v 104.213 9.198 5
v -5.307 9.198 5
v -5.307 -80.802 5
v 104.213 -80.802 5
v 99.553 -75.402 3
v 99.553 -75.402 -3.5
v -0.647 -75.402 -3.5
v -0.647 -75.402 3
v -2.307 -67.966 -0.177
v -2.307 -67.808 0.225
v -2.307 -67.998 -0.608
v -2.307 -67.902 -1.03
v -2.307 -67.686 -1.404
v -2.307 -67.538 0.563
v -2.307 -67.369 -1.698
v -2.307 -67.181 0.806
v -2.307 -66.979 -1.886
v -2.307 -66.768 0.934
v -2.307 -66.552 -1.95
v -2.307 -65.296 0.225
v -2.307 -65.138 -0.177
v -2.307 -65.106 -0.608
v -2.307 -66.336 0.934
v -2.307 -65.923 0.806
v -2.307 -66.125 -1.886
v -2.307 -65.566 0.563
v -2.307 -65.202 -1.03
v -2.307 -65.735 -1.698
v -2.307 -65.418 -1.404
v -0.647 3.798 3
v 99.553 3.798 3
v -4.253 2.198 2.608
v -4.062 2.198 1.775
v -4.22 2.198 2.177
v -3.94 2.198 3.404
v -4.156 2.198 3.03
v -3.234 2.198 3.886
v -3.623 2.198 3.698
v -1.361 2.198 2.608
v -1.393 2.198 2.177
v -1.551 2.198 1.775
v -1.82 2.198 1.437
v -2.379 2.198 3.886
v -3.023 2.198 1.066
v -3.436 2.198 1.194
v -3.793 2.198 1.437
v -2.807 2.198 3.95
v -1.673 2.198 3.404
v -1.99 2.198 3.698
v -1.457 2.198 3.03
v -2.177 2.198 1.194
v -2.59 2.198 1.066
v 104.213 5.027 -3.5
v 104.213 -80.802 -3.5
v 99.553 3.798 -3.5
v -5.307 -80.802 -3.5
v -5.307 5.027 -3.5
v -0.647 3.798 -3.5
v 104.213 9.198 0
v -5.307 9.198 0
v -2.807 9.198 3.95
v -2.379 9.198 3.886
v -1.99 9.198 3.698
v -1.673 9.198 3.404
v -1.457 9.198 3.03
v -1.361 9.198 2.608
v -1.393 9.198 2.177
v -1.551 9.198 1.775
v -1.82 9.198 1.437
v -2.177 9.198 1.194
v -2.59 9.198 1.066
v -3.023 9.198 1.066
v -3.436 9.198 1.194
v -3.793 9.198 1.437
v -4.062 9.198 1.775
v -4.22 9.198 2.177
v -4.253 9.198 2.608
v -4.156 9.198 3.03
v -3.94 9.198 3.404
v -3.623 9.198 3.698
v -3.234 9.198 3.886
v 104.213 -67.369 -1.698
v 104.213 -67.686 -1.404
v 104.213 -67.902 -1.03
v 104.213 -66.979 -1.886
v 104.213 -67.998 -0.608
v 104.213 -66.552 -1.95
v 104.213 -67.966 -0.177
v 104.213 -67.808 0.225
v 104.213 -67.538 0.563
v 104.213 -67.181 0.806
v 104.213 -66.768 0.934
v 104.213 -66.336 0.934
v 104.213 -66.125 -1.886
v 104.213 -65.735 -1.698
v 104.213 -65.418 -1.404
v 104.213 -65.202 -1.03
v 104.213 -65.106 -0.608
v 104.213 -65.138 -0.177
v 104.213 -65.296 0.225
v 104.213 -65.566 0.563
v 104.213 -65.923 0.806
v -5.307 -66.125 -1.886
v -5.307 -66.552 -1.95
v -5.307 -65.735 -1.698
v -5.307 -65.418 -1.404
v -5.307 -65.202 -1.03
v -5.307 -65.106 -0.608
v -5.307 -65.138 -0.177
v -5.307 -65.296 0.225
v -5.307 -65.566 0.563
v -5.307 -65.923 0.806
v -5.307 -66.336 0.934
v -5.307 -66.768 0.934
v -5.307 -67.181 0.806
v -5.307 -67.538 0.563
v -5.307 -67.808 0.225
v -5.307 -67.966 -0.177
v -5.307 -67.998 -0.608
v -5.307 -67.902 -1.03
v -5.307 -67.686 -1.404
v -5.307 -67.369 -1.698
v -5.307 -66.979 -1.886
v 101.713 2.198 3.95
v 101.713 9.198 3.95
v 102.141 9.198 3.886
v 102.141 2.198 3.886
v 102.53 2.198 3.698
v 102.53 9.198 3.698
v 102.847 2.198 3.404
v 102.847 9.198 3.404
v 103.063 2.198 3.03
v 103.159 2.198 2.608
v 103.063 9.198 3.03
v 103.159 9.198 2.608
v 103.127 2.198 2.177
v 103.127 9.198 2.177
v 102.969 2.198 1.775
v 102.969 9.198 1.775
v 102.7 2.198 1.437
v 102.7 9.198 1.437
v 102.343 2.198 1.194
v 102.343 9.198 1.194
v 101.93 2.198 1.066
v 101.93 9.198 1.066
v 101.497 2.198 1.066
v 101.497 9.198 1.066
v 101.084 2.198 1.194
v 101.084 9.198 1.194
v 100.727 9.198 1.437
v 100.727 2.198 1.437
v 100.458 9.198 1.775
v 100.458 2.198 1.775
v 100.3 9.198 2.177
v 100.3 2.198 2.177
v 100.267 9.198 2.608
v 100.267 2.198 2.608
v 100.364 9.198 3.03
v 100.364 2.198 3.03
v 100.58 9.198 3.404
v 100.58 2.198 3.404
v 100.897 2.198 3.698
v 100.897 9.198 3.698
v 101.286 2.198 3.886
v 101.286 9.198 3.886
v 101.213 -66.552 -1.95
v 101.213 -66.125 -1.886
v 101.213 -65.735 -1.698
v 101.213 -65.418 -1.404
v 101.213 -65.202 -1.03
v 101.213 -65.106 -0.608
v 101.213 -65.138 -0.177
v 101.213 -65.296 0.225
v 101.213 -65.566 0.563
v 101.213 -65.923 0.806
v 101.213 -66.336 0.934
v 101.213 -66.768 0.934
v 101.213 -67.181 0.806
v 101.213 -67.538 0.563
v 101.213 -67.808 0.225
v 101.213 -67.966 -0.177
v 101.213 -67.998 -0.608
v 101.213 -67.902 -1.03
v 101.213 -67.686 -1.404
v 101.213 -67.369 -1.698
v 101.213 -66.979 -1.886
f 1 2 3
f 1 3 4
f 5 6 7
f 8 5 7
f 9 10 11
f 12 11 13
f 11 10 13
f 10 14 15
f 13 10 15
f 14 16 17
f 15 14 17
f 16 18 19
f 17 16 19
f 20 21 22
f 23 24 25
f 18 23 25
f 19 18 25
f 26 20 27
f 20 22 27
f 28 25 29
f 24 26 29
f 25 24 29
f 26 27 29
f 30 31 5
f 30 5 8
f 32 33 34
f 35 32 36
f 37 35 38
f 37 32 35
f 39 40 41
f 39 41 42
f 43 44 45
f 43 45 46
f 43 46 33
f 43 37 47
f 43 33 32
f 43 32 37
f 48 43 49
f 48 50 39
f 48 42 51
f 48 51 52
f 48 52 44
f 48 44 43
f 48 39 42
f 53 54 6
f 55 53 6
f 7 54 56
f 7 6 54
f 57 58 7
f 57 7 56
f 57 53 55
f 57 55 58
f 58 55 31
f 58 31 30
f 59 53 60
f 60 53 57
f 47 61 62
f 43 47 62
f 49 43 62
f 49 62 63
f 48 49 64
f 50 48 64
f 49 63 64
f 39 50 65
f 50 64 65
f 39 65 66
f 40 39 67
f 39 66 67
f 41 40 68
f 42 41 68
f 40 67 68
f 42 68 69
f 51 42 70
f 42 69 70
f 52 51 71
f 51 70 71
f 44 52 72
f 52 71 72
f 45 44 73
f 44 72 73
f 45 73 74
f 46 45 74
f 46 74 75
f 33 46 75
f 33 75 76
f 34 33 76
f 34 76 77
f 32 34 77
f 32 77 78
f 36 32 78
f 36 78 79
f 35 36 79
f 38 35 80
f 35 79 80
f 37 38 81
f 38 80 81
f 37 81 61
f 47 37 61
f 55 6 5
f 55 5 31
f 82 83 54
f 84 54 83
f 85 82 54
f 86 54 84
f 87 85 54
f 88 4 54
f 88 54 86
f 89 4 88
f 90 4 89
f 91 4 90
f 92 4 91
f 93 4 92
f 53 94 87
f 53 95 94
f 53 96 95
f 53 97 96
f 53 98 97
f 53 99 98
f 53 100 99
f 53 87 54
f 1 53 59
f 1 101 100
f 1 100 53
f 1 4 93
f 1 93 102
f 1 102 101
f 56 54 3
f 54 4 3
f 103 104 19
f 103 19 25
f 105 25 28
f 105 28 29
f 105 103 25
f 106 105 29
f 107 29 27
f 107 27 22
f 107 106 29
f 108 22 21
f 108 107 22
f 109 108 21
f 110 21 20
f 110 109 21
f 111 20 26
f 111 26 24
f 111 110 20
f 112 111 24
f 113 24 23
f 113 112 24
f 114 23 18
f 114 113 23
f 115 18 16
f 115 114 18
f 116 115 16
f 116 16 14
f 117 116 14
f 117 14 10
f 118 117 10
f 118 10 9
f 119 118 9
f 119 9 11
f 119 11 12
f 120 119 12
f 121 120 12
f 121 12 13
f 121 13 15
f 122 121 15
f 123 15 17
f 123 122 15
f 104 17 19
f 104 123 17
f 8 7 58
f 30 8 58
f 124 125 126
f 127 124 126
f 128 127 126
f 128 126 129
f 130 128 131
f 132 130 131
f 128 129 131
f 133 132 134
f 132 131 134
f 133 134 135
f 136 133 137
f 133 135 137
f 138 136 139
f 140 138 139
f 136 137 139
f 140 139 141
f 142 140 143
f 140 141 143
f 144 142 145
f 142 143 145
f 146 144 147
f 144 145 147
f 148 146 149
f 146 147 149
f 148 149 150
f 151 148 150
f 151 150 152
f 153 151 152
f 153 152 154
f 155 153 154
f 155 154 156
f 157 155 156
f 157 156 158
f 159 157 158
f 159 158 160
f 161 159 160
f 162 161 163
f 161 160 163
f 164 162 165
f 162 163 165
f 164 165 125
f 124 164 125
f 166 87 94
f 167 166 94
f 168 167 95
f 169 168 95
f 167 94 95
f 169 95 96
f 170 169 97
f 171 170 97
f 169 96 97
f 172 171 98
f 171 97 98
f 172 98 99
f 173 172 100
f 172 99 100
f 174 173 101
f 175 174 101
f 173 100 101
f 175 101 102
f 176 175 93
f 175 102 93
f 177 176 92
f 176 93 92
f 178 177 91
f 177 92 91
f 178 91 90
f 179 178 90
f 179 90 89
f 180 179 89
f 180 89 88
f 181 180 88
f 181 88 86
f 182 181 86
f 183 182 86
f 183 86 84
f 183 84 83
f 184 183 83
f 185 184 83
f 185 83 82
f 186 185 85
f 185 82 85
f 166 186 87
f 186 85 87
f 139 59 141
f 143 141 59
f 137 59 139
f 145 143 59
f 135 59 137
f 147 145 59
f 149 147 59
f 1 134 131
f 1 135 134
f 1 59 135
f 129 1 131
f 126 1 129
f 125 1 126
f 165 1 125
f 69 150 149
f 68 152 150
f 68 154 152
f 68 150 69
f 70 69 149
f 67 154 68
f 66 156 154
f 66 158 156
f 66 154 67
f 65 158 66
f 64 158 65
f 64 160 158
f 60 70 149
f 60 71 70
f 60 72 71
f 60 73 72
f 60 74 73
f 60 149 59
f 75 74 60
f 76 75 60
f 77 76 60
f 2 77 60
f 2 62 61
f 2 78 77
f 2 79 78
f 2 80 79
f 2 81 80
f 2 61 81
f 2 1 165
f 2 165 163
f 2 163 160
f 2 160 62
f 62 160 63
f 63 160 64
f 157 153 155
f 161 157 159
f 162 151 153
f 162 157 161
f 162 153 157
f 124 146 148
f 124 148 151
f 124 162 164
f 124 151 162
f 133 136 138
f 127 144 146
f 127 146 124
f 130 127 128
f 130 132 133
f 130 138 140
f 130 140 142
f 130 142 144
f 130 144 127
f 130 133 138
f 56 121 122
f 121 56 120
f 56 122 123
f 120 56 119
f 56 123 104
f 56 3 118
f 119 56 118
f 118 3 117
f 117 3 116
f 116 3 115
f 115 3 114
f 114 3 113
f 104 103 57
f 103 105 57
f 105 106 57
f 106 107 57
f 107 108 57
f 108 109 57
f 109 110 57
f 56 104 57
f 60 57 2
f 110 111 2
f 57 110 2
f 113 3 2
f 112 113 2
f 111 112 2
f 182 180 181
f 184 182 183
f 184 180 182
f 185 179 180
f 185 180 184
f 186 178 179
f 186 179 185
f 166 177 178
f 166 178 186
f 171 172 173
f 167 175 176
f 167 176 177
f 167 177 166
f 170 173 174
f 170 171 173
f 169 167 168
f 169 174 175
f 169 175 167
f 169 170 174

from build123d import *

# Parameters (mm, degrees)
SKETCH1_W           = 109.52
SKETCH1_H           = 90
BOSS_EXTRUDE1_DEPTH = 5
SKETCH2_R           = 1.45
CUT_EXTRUDE1_DEPTH  = 7
SKETCH4_W           = 109.52
SKETCH4_H           = 90
BOSS_EXTRUDE2_DEPTH = 3.5
CHAMFER1_SIZE       = 3.5
CHAMFER1_SIZE2      = 4.171137574
SKETCH5_W           = 100.2
SKETCH5_H           = 79.2
CUT_EXTRUDE3_DEPTH  = 6.5
SKETCH8_R           = 1.45
CUT_EXTRUDE5_DEPTH  = 3


with BuildPart() as part:
    # Sketch1 → Boss-Extrude1 (new body)
    with BuildSketch(Plane.XY):
        with Locations((49.453432203, -35.801949153)):
            Rectangle(SKETCH1_W, SKETCH1_H)
    extrude(amount=BOSS_EXTRUDE1_DEPTH)

    # Sketch2 → Cut-Extrude1 (cut)
    with BuildSketch(Plane(origin=(0, 9.198050847, 0), x_dir=(1, 0, 0), z_dir=(0, 1, 0))):
        with Locations(Location((-2.806567797, -2.5, 0), (0, 0, 270))):
            Circle(SKETCH2_R)
        with Locations(Location((101.713432203, -2.5, 0), (0, 0, 270))):
            Circle(SKETCH2_R)
    extrude(amount=-CUT_EXTRUDE1_DEPTH, mode=Mode.SUBTRACT)

    # Sketch4 → Boss-Extrude2 (add)
    with BuildSketch(Plane(origin=(0, 0, 0), x_dir=(-1, 0, 0), z_dir=(0, 0, -1))):
        with Locations((-49.453432203, -35.801949153)):
            Rectangle(SKETCH4_W, SKETCH4_H)
    extrude(amount=BOSS_EXTRUDE2_DEPTH)

    # Chamfer1
    chamfer1_edges = [part.edges().sort_by_distance(p)[0] for p in [
        (49.453432203, 9.198050847, -3.5),
    ]]
    chamfer1_side = [part.faces().sort_by_distance(p)[0] for p in [
        (49.453432203, 9.198050847, 0.724808812),
    ]]
    chamfer(chamfer1_edges, length=CHAMFER1_SIZE, length2=CHAMFER1_SIZE2, reference=chamfer1_side[0])

    # Sketch5 → Cut-Extrude3 (cut)
    with BuildSketch(Plane(origin=(0, 0, -3.5), x_dir=(-1, 0, 0), z_dir=(0, 0, -1))):
        with Locations((-49.453432203, -35.801949153)):
            Rectangle(SKETCH5_W, SKETCH5_H)
    extrude(amount=-CUT_EXTRUDE3_DEPTH, mode=Mode.SUBTRACT)

    # Sketch8 → Cut-Extrude5 (cut)
    with BuildSketch(Plane(origin=(104.213432203, 0, 0), x_dir=(0, 0, -1), z_dir=(1, 0, 0))):
        with Locations((0.5, -66.551949153)):
            Circle(SKETCH8_R)
    cut_extrude5 = extrude(amount=-CUT_EXTRUDE5_DEPTH, mode=Mode.SUBTRACT)

    # Mirror2: Cut-Extrude5 across plane
    add(cut_extrude5.mirror(Plane.ZY.offset(-49.453432203)), mode=Mode.SUBTRACT)


solid = part.part
